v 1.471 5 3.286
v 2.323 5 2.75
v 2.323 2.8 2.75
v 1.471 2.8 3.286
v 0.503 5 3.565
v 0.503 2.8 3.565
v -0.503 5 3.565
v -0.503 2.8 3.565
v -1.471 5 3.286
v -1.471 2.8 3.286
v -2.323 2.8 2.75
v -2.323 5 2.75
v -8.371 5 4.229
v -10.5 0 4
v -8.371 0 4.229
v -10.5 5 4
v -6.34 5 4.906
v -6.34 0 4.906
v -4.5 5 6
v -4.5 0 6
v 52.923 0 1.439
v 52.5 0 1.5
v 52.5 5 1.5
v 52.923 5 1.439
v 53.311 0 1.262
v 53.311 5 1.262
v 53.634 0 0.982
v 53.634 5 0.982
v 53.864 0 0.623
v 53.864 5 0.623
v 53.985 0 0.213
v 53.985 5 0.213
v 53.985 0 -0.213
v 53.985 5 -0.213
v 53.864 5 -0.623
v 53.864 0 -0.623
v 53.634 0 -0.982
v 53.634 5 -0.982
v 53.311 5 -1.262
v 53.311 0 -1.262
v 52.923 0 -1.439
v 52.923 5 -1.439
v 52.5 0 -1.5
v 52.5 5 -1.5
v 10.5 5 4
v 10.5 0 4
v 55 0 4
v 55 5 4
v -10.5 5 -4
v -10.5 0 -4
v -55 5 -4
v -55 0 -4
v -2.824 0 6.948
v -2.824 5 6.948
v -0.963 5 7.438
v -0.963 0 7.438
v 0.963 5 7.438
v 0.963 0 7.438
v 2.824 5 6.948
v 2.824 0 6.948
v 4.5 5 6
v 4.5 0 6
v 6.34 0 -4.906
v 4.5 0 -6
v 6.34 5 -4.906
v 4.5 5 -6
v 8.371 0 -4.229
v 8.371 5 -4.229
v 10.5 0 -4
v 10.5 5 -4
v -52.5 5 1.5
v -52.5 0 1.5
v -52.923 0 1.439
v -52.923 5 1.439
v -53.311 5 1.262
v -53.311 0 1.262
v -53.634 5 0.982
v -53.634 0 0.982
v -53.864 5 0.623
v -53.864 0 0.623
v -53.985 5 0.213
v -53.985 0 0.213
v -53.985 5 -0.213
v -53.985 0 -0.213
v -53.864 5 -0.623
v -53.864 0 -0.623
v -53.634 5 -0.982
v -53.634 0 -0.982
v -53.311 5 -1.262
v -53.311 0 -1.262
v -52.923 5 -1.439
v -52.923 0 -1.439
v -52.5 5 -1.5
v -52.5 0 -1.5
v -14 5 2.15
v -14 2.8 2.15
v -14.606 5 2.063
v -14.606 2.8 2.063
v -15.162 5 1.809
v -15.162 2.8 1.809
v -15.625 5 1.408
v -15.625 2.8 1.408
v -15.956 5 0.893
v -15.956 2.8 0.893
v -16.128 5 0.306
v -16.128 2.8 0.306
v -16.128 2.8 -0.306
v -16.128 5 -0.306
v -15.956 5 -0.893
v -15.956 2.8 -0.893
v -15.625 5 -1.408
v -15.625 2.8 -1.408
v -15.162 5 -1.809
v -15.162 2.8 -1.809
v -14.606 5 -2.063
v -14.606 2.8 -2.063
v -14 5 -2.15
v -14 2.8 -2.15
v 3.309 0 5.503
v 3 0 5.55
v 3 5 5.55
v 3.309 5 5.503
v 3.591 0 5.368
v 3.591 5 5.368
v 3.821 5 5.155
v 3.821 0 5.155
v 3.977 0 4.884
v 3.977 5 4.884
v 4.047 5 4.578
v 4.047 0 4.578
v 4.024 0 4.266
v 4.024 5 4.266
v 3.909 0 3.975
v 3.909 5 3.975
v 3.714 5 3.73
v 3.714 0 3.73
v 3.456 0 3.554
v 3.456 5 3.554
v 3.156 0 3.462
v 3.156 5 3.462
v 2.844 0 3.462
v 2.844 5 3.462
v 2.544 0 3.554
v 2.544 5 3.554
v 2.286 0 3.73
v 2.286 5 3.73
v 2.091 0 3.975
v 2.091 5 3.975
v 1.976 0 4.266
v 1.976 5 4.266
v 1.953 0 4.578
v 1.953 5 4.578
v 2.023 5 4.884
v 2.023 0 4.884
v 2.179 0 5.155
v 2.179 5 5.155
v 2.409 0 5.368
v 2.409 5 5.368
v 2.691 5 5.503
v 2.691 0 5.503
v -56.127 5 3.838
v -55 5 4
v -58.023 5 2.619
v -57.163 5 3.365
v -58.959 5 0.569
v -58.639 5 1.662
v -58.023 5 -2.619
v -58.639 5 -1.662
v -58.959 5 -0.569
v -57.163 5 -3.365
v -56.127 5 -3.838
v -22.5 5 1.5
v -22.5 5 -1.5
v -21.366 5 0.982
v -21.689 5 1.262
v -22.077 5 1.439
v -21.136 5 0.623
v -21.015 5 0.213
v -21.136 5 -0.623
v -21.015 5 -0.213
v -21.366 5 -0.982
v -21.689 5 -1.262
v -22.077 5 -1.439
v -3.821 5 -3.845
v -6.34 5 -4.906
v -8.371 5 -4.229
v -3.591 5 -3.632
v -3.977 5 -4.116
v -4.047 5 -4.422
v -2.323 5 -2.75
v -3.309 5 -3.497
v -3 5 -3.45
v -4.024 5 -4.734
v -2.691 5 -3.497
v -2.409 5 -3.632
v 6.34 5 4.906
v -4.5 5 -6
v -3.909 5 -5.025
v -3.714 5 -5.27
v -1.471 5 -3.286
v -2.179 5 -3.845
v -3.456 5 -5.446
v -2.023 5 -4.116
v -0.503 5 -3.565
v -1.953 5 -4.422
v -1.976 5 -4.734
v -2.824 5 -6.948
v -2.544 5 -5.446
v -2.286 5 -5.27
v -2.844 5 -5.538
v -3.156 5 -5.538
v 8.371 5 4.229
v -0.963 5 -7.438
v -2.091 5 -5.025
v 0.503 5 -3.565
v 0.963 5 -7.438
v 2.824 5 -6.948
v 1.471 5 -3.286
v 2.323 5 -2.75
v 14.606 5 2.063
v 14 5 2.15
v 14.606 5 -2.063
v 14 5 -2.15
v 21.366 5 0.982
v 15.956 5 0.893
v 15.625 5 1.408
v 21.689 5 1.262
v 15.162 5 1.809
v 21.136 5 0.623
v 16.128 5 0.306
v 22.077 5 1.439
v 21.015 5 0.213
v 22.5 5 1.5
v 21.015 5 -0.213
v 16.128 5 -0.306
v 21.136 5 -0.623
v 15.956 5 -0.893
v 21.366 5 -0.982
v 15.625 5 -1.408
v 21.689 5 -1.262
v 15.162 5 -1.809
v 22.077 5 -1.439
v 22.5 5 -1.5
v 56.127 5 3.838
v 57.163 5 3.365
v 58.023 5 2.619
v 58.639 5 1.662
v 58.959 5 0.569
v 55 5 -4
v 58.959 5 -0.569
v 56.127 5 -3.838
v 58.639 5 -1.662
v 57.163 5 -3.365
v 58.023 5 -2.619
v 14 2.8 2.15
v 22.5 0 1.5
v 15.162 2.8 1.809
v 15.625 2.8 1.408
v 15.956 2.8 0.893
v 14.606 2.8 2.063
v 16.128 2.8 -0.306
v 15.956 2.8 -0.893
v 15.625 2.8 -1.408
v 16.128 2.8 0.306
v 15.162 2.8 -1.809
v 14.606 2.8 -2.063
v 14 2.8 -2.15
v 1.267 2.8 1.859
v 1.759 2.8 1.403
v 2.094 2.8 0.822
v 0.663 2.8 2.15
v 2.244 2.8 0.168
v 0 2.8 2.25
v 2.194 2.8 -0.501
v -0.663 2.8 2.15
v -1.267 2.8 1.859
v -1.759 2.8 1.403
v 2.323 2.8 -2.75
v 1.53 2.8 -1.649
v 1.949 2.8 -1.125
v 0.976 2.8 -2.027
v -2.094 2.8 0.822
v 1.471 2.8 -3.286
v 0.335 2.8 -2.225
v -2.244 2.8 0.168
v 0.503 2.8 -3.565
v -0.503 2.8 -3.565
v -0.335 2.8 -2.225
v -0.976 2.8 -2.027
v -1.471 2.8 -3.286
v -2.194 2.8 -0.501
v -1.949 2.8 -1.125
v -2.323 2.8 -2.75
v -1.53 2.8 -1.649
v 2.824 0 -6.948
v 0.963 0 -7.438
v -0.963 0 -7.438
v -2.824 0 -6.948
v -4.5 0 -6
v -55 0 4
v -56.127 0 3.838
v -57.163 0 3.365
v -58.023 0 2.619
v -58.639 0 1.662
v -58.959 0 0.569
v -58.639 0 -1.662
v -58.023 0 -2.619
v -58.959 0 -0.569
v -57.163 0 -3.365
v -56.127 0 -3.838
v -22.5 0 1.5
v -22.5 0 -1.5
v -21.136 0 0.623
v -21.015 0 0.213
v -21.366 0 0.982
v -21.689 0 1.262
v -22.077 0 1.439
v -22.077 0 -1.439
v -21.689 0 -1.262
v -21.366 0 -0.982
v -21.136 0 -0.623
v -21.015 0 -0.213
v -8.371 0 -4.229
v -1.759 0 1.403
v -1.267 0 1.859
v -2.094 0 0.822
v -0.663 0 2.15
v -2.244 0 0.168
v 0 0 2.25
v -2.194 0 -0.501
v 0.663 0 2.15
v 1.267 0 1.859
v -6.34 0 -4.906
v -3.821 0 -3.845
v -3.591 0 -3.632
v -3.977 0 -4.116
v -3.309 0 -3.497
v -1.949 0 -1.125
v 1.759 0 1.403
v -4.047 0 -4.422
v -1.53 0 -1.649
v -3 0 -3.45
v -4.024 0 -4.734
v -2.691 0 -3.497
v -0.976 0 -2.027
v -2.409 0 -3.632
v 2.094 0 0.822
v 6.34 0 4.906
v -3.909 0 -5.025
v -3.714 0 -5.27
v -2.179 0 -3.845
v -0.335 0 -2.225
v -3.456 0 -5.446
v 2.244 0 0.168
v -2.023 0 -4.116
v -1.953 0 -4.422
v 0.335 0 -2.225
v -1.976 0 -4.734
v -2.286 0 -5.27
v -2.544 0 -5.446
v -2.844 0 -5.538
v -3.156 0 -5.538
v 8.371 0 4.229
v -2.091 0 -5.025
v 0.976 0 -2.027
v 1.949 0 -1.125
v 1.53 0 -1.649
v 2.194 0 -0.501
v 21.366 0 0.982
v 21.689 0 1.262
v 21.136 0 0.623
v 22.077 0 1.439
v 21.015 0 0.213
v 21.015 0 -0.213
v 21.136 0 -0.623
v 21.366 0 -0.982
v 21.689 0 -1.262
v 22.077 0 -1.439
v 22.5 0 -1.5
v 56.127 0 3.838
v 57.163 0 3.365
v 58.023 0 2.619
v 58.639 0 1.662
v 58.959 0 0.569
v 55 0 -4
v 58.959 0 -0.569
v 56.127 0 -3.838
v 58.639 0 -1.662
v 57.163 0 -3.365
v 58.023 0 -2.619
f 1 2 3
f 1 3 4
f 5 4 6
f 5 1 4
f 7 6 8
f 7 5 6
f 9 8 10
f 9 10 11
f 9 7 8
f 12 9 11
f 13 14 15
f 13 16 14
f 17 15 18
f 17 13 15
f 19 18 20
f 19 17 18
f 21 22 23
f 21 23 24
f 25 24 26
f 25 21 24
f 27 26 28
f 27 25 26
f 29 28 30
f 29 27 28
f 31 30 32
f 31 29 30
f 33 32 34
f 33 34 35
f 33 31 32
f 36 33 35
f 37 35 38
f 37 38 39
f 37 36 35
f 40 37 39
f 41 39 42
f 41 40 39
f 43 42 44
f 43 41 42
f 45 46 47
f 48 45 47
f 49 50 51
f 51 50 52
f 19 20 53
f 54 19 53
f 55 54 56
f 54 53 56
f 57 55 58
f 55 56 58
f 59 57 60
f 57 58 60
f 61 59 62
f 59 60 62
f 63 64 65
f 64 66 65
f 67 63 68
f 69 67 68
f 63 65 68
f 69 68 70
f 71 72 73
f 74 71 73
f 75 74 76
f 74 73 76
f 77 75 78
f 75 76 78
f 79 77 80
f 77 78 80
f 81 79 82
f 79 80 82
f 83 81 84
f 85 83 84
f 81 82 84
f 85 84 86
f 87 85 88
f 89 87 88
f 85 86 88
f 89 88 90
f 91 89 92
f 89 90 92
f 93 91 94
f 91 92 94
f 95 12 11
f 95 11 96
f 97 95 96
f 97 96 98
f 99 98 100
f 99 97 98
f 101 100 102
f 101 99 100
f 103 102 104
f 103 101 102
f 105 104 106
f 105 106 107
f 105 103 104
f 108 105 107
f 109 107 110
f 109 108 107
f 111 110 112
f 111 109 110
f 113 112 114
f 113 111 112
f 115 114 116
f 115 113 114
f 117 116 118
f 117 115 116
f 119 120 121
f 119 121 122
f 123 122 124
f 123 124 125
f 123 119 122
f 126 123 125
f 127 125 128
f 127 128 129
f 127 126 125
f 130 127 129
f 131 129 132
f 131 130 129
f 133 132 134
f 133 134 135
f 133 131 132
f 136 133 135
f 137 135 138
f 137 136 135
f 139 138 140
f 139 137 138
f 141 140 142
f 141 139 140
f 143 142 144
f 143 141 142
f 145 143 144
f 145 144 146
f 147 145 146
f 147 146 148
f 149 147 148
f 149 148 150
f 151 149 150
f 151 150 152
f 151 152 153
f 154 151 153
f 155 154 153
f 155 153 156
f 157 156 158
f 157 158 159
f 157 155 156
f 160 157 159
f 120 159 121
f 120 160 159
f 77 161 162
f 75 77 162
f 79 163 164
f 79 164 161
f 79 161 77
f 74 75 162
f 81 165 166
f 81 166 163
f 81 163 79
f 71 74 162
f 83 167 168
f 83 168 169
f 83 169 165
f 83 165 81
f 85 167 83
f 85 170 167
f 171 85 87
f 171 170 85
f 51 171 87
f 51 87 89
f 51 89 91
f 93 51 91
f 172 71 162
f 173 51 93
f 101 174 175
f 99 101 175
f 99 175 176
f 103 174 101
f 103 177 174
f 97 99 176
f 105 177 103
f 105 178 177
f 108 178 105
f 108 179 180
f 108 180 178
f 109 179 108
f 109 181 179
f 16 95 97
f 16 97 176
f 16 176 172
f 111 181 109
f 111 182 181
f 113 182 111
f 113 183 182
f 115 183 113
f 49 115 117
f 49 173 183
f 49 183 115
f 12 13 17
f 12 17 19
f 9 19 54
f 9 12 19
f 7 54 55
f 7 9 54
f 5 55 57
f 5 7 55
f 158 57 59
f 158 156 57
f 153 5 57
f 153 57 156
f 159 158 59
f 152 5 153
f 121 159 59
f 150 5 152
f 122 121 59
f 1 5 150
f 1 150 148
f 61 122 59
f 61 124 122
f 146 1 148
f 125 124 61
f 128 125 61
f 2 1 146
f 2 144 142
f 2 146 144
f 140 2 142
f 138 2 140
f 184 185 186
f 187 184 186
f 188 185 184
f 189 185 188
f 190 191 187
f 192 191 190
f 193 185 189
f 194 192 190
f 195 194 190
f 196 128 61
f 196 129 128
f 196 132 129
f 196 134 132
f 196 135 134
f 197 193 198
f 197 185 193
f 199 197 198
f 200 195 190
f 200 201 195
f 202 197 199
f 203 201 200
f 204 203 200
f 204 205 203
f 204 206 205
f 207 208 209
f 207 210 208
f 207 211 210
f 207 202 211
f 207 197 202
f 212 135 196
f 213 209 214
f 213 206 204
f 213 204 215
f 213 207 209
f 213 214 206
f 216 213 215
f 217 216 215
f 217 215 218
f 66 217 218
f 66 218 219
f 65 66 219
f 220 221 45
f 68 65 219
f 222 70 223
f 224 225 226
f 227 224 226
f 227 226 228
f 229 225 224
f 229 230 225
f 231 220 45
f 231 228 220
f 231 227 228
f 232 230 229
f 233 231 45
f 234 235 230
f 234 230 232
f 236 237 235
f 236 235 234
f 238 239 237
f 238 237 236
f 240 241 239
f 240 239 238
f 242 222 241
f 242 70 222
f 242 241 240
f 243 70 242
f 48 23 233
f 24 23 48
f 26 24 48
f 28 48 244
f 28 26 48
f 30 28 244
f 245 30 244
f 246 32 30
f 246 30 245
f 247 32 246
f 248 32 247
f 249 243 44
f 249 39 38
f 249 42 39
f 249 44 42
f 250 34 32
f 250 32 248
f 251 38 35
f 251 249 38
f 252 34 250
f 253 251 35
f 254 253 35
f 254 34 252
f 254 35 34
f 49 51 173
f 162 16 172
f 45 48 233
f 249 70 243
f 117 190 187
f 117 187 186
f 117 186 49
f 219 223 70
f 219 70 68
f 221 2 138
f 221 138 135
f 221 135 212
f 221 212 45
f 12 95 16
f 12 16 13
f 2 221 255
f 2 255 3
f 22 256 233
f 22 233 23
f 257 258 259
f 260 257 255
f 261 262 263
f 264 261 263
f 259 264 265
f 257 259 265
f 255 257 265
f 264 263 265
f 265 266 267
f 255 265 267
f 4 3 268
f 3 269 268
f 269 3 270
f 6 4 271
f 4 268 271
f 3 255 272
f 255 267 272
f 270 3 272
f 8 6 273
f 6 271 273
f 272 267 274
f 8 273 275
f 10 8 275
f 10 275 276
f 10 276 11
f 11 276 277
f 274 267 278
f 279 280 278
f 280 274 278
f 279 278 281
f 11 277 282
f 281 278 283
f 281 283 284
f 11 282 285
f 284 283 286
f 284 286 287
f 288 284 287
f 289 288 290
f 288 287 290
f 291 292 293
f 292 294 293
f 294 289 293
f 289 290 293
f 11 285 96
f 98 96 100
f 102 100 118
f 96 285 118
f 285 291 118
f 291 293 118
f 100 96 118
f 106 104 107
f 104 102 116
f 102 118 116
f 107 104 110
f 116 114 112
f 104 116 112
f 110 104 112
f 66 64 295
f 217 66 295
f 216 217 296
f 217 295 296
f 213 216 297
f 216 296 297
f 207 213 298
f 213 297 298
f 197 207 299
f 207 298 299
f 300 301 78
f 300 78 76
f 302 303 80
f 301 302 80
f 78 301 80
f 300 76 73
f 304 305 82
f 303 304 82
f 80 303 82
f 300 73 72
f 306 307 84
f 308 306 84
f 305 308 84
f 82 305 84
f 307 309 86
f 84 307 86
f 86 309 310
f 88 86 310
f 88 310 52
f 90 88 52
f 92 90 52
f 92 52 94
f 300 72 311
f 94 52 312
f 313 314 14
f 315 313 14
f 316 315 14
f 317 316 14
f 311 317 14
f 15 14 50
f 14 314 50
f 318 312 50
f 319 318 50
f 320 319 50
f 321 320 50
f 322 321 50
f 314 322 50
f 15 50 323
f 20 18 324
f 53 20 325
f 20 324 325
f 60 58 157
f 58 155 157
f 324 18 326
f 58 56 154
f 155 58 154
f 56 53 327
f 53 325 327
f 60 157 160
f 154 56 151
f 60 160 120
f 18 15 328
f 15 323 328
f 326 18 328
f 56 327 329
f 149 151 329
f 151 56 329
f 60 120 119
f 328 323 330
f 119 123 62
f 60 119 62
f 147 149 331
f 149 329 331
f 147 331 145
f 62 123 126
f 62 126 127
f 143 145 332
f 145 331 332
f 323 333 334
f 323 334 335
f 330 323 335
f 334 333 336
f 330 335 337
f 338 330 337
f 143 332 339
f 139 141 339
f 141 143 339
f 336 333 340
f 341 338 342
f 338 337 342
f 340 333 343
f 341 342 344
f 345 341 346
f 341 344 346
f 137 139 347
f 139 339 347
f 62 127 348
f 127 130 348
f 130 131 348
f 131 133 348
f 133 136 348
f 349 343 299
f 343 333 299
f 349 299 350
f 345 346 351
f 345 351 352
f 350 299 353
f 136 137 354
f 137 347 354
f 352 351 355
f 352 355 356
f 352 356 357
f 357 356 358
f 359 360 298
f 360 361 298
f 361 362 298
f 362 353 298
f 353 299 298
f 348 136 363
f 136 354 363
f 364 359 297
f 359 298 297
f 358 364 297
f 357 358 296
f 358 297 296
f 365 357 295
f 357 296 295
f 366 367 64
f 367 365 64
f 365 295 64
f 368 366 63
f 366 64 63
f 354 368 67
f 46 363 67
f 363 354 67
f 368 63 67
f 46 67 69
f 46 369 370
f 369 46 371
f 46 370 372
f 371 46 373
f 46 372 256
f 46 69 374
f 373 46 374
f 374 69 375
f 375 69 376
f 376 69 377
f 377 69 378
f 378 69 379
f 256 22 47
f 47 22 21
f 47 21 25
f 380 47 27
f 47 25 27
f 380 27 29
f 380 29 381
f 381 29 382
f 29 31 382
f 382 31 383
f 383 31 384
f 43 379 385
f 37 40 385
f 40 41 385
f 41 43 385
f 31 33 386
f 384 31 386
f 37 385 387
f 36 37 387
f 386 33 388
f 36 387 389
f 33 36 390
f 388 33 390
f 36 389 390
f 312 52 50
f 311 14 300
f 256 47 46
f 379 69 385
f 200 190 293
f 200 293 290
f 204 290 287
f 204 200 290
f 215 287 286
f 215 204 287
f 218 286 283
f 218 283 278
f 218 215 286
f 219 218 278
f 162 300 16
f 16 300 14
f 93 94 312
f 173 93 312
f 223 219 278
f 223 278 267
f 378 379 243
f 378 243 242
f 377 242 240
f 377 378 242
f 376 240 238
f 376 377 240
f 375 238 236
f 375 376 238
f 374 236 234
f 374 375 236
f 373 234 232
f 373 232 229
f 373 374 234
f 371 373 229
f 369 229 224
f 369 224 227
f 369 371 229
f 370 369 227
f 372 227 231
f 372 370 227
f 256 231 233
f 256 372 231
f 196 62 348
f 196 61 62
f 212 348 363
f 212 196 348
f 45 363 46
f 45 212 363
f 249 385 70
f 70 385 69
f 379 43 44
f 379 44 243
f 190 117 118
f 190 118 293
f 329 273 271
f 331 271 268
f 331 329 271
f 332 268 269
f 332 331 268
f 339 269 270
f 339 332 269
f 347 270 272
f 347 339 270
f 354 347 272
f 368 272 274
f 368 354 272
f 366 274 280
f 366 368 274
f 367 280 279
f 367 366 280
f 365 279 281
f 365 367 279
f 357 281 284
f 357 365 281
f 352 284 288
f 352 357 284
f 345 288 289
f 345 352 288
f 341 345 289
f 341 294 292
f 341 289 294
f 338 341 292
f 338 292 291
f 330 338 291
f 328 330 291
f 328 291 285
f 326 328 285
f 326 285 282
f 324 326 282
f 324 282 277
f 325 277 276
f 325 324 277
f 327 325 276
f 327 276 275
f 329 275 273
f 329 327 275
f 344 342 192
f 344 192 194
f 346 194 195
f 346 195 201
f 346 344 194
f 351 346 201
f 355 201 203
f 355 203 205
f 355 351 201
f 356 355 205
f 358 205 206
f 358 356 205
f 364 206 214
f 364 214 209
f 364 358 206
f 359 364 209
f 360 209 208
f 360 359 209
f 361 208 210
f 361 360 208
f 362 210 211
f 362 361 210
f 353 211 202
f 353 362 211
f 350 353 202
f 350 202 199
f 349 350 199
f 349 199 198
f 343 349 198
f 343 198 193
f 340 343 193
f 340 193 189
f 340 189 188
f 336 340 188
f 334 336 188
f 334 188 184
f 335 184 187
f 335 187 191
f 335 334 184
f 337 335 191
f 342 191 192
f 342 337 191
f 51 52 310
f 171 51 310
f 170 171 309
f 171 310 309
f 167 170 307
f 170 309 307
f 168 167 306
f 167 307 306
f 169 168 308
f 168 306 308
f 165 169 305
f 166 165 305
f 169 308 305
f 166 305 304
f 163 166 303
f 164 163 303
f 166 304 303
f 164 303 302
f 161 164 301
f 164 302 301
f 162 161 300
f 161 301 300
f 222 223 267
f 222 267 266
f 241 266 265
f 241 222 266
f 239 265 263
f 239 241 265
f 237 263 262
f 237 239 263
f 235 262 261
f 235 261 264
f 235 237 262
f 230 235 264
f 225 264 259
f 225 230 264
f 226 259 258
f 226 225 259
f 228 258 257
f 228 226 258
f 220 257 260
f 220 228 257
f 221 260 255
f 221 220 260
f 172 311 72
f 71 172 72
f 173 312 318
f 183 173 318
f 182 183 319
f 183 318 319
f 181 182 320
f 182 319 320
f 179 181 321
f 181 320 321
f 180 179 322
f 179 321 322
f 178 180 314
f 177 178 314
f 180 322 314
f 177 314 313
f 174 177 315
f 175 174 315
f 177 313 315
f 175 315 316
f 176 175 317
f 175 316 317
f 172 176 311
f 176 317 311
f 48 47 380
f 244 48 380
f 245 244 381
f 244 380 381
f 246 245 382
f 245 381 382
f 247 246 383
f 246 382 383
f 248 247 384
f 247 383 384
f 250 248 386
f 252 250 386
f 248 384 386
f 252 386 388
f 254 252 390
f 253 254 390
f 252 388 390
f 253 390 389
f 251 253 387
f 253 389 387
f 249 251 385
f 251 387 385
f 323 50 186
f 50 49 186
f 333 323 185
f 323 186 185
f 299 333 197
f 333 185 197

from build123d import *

# Parameters (mm, degrees)
ESQUISSE1_R             = 1.05
ESQUISSE1_R_2           = 2.25
BOSS_EXTRU_1_DEPTH      = 5
ENL_V_MAT_EXTRU_1_DEPTH = 2.2
CONG_1_R                = 10


with BuildPart() as part:
    # Esquisse1 → Boss.-Extru.1 (new body)
    with BuildSketch(Plane(origin=(0, 0, 0), x_dir=(1, 0, 0), z_dir=(0, 1, 0))):
        with BuildLine():
            Line((-6.34428877, 4), (-55, 4))
            ThreePointArc((-55, 4), (-59, 0), (-55, -4))
            Line((-55, -4), (-6.34428877, -4))
            ThreePointArc((-6.34428877, -4), (0, -7.5), (6.34428877, -4))
            Line((6.34428877, -4), (55, -4))
            ThreePointArc((55, -4), (59, 0), (55, 4))
            Line((55, 4), (6.34428877, 4))
            ThreePointArc((6.34428877, 4), (0, 7.5), (-6.34428877, 4))
        make_face()
        with Locations(Location((-3, 4.5, 0), (0, 0, 270))):
            Circle(ESQUISSE1_R, mode=Mode.SUBTRACT)
        with Locations(Location((3, -4.5, 0), (0, 0, 270))):
            Circle(ESQUISSE1_R, mode=Mode.SUBTRACT)
        with Locations(Location((0, 0, 0), (0, 0, 270))):
            Circle(ESQUISSE1_R_2, mode=Mode.SUBTRACT)
        with BuildLine():
            Line((-22.5, -1.5), (-52.5, -1.5))
            ThreePointArc((-52.5, -1.5), (-54, 0), (-52.5, 1.5))
            Line((-52.5, 1.5), (-22.5, 1.5))
            ThreePointArc((-22.5, 1.5), (-21, 0), (-22.5, -1.5))
        make_face(mode=Mode.SUBTRACT)
        with BuildLine():
            Line((22.5, -1.5), (52.5, -1.5))
            ThreePointArc((52.5, -1.5), (54, 0), (52.5, 1.5))
            Line((52.5, 1.5), (22.5, 1.5))
            ThreePointArc((22.5, 1.5), (21, 0), (22.5, -1.5))
        make_face(mode=Mode.SUBTRACT)
    extrude(amount=BOSS_EXTRU_1_DEPTH)

    # Esquisse2 → Enlèv. mat.-Extru.1 (cut)
    with BuildSketch(Plane(origin=(0, 5, 0), x_dir=(1, 0, 0), z_dir=(0, 1, 0))):
        with BuildLine():
            Line((-14, 2.15), (-2.323252031, 2.75))
            ThreePointArc((-2.323252031, 2.75), (0, 3.6), (2.323252031, 2.75))
            Line((2.323252031, 2.75), (14, 2.15))
            ThreePointArc((14, 2.15), (16.15, 0), (14, -2.15))
            Line((14, -2.15), (2.323252031, -2.75))
            ThreePointArc((2.323252031, -2.75), (0, -3.6), (-2.323252031, -2.75))
            Line((-2.323252031, -2.75), (-14, -2.15))
            ThreePointArc((-14, -2.15), (-16.15, 0), (-14, 2.15))
        make_face()
    extrude(amount=-ENL_V_MAT_EXTRU_1_DEPTH, mode=Mode.SUBTRACT)

    # Congé1
    cong_1_edges = [part.edges().sort_by_distance(p)[0] for p in [
        (6.34428877, 2.5, 4),
        (-6.34428877, 2.5, 4),
        (-6.34428877, 2.5, -4),
        (6.34428877, 2.5, -4),
    ]]
    fillet(cong_1_edges, radius=CONG_1_R)


solid = part.part
